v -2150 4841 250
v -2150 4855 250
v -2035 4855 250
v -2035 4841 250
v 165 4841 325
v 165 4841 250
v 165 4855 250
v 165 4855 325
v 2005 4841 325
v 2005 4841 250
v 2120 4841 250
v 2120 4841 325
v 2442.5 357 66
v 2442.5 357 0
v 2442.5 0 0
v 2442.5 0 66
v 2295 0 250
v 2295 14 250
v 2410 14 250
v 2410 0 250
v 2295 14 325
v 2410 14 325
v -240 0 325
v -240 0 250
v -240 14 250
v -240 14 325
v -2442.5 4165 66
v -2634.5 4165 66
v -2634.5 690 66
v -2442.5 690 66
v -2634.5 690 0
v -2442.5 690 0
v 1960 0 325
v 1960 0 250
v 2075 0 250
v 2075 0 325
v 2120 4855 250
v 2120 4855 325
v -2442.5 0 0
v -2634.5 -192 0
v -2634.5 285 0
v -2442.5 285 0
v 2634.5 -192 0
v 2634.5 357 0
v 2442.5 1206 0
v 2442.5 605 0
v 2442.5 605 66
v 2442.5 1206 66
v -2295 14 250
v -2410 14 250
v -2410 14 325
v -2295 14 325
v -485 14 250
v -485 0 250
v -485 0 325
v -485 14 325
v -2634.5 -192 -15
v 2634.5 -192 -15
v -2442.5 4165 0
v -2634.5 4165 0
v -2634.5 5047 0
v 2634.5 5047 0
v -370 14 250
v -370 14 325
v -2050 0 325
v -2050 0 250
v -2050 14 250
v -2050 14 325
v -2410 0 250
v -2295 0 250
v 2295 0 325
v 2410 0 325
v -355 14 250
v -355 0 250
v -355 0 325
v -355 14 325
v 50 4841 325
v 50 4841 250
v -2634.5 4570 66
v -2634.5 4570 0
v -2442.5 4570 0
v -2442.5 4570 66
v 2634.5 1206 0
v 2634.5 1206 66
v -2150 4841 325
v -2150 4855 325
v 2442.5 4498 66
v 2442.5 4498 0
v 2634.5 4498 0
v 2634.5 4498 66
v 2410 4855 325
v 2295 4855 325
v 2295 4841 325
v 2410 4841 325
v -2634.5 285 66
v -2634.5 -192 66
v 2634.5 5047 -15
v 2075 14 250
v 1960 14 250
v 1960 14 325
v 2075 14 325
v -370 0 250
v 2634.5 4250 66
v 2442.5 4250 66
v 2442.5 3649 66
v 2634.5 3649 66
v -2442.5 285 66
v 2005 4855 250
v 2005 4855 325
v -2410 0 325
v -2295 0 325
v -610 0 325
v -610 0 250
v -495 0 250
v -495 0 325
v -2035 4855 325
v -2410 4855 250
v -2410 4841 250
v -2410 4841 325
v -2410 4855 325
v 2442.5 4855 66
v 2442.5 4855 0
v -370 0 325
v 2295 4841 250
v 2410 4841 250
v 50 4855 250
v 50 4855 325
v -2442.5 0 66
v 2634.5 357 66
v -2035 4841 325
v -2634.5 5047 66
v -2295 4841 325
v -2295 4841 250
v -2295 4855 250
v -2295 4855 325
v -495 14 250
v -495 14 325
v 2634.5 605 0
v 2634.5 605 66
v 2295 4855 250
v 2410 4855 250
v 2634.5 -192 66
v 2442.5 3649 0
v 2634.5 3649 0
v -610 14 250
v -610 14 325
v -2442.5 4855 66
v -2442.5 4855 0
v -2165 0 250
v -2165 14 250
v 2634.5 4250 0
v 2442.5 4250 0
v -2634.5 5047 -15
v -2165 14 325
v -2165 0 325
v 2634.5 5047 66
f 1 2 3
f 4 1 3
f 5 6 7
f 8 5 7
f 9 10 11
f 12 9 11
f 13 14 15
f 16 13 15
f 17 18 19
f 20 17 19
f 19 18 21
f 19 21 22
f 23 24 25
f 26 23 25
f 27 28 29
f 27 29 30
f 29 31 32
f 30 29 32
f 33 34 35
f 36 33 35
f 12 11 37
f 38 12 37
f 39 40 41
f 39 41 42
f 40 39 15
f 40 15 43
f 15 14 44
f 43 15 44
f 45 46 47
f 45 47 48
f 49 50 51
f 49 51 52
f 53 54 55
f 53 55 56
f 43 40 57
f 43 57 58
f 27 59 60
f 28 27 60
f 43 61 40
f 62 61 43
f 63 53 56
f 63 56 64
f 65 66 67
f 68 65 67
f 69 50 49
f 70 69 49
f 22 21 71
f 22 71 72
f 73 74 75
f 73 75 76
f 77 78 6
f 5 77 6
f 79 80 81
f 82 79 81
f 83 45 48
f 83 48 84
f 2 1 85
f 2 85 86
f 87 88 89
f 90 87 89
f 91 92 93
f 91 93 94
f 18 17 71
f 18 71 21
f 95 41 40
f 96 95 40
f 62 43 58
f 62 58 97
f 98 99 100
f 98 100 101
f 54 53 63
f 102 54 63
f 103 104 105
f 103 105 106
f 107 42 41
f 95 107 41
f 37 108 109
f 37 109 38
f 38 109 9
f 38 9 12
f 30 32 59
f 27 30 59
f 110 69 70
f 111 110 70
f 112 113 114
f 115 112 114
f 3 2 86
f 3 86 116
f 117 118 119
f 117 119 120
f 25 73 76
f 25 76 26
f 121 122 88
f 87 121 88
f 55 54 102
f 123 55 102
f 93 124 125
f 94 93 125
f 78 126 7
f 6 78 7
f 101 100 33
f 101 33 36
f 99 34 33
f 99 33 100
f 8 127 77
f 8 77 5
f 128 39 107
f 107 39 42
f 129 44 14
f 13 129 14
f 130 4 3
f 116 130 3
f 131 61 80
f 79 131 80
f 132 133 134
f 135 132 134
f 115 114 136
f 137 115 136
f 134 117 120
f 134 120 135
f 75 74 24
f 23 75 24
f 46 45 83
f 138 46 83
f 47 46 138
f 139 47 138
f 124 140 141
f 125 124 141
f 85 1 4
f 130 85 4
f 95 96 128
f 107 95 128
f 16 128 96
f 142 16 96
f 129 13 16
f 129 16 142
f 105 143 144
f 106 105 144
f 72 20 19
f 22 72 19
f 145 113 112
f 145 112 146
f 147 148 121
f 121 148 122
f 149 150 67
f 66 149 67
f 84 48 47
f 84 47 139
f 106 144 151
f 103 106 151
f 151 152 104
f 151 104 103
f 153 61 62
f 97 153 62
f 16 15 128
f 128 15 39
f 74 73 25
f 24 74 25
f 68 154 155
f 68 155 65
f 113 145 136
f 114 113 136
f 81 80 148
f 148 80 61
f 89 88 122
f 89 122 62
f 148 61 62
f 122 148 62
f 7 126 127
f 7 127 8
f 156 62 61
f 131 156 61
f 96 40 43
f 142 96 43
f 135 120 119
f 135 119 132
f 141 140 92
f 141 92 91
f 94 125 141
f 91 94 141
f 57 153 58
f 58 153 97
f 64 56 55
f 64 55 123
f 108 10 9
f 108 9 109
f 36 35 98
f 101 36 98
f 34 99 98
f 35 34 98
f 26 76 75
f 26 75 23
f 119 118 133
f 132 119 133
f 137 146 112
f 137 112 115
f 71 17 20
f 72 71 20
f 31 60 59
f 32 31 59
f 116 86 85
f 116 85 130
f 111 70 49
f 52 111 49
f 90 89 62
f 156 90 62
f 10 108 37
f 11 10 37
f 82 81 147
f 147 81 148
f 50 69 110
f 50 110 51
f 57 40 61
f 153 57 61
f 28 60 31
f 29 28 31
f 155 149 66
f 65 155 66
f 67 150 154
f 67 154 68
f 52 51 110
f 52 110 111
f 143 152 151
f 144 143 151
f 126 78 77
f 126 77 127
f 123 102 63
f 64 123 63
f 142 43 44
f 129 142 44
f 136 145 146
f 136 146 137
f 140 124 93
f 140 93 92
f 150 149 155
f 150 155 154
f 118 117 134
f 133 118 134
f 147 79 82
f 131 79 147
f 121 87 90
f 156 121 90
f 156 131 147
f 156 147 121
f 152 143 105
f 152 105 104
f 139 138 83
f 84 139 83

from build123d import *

# Parameters (mm, degrees)
F1_W      = 192
F1_H      = 601
F5_DEPTH  = 66
F6_W      = 5269
F6_H      = 5239
F7_DEPTH  = 15
F2_W      = 115
F2_H      = 14
F8_DEPTH  = 75
F3_W      = 115
F3_H      = 14
F9_DEPTH  = 75
F4_W      = 115
F4_H      = 14
F10_DEPTH = 75


with BuildPart() as f5:
    # F1 (on Top) → F5 (new body)
    with BuildSketch(Plane.XY):
        with Locations((2538.5, 905.5)):
            Rectangle(F1_W, F1_H)
        with Locations((2538.5, 3949.5)):
            Rectangle(F1_W, F1_H)
        Polygon((-2588.5, 4570), (-2488.5, 4570), (-2442.5, 4570), (-2442.5, 4855), (2442.5, 4855), (2442.5, 4498), (2634.5, 4498), (2634.5, 5047), (-2634.5, 5047), (-2634.5, 4570), align=None)
        Polygon((-2588.5, 690), (-2488.5, 690), (-2442.5, 690), (-2442.5, 4165), (-2488.5, 4165), (-2588.5, 4165), (-2634.5, 4165), (-2634.5, 690), align=None)
        Polygon((2442.5, 0), (-2442.5, 0), (-2442.5, 285), (-2488.5, 285), (-2588.5, 285), (-2634.5, 285), (-2634.5, -192), (2634.5, -192), (2634.5, 357), (2442.5, 357), align=None)
    extrude(amount=F5_DEPTH)


with BuildPart() as f7:
    # F6 (on Top) → F7 (new body)
    with BuildSketch(Plane.XY):
        with Locations((0, 2427.5)):
            Rectangle(F6_W, F6_H)
    extrude(amount=-F7_DEPTH)


with BuildPart() as f8:
    # F2 (on offset) → F8 (new body)
    with BuildSketch(Plane.XY.offset(250)):
        with Locations((2352.5, 7)):
            Rectangle(F2_W, F2_H)
        with Locations((-2352.5, 7)):
            Rectangle(F2_W, F2_H)
        with Locations((-2352.5, 4848)):
            Rectangle(F2_W, F2_H)
        with Locations((2352.5, 4848)):
            Rectangle(F2_W, F2_H)
    extrude(amount=F8_DEPTH)


with BuildPart() as f9:
    # F3 (on offset) → F9 (new body)
    with BuildSketch(Plane.XY.offset(250)):
        with Locations((2017.5, 7)):
            Rectangle(F3_W, F3_H)
        with Locations((-427.5, 7)):
            Rectangle(F3_W, F3_H)
        with Locations((-552.5, 7)):
            Rectangle(F3_W, F3_H)
        with Locations((-2107.5, 7)):
            Rectangle(F3_W, F3_H)
        with Locations((-2092.5, 4848)):
            Rectangle(F3_W, F3_H)
        with Locations((107.5, 4848)):
            Rectangle(F3_W, F3_H)
        with Locations((2062.5, 4848)):
            Rectangle(F3_W, F3_H)
    extrude(amount=F9_DEPTH)


with BuildPart() as f10:
    # F4 (on offset) → F10 (new body)
    with BuildSketch(Plane.XY.offset(250)):
        with Locations((-297.5, 7)):
            Rectangle(F4_W, F4_H)
    extrude(amount=F10_DEPTH)


solid = Compound([f5.part, f7.part, f8.part, f9.part, f10.part])
